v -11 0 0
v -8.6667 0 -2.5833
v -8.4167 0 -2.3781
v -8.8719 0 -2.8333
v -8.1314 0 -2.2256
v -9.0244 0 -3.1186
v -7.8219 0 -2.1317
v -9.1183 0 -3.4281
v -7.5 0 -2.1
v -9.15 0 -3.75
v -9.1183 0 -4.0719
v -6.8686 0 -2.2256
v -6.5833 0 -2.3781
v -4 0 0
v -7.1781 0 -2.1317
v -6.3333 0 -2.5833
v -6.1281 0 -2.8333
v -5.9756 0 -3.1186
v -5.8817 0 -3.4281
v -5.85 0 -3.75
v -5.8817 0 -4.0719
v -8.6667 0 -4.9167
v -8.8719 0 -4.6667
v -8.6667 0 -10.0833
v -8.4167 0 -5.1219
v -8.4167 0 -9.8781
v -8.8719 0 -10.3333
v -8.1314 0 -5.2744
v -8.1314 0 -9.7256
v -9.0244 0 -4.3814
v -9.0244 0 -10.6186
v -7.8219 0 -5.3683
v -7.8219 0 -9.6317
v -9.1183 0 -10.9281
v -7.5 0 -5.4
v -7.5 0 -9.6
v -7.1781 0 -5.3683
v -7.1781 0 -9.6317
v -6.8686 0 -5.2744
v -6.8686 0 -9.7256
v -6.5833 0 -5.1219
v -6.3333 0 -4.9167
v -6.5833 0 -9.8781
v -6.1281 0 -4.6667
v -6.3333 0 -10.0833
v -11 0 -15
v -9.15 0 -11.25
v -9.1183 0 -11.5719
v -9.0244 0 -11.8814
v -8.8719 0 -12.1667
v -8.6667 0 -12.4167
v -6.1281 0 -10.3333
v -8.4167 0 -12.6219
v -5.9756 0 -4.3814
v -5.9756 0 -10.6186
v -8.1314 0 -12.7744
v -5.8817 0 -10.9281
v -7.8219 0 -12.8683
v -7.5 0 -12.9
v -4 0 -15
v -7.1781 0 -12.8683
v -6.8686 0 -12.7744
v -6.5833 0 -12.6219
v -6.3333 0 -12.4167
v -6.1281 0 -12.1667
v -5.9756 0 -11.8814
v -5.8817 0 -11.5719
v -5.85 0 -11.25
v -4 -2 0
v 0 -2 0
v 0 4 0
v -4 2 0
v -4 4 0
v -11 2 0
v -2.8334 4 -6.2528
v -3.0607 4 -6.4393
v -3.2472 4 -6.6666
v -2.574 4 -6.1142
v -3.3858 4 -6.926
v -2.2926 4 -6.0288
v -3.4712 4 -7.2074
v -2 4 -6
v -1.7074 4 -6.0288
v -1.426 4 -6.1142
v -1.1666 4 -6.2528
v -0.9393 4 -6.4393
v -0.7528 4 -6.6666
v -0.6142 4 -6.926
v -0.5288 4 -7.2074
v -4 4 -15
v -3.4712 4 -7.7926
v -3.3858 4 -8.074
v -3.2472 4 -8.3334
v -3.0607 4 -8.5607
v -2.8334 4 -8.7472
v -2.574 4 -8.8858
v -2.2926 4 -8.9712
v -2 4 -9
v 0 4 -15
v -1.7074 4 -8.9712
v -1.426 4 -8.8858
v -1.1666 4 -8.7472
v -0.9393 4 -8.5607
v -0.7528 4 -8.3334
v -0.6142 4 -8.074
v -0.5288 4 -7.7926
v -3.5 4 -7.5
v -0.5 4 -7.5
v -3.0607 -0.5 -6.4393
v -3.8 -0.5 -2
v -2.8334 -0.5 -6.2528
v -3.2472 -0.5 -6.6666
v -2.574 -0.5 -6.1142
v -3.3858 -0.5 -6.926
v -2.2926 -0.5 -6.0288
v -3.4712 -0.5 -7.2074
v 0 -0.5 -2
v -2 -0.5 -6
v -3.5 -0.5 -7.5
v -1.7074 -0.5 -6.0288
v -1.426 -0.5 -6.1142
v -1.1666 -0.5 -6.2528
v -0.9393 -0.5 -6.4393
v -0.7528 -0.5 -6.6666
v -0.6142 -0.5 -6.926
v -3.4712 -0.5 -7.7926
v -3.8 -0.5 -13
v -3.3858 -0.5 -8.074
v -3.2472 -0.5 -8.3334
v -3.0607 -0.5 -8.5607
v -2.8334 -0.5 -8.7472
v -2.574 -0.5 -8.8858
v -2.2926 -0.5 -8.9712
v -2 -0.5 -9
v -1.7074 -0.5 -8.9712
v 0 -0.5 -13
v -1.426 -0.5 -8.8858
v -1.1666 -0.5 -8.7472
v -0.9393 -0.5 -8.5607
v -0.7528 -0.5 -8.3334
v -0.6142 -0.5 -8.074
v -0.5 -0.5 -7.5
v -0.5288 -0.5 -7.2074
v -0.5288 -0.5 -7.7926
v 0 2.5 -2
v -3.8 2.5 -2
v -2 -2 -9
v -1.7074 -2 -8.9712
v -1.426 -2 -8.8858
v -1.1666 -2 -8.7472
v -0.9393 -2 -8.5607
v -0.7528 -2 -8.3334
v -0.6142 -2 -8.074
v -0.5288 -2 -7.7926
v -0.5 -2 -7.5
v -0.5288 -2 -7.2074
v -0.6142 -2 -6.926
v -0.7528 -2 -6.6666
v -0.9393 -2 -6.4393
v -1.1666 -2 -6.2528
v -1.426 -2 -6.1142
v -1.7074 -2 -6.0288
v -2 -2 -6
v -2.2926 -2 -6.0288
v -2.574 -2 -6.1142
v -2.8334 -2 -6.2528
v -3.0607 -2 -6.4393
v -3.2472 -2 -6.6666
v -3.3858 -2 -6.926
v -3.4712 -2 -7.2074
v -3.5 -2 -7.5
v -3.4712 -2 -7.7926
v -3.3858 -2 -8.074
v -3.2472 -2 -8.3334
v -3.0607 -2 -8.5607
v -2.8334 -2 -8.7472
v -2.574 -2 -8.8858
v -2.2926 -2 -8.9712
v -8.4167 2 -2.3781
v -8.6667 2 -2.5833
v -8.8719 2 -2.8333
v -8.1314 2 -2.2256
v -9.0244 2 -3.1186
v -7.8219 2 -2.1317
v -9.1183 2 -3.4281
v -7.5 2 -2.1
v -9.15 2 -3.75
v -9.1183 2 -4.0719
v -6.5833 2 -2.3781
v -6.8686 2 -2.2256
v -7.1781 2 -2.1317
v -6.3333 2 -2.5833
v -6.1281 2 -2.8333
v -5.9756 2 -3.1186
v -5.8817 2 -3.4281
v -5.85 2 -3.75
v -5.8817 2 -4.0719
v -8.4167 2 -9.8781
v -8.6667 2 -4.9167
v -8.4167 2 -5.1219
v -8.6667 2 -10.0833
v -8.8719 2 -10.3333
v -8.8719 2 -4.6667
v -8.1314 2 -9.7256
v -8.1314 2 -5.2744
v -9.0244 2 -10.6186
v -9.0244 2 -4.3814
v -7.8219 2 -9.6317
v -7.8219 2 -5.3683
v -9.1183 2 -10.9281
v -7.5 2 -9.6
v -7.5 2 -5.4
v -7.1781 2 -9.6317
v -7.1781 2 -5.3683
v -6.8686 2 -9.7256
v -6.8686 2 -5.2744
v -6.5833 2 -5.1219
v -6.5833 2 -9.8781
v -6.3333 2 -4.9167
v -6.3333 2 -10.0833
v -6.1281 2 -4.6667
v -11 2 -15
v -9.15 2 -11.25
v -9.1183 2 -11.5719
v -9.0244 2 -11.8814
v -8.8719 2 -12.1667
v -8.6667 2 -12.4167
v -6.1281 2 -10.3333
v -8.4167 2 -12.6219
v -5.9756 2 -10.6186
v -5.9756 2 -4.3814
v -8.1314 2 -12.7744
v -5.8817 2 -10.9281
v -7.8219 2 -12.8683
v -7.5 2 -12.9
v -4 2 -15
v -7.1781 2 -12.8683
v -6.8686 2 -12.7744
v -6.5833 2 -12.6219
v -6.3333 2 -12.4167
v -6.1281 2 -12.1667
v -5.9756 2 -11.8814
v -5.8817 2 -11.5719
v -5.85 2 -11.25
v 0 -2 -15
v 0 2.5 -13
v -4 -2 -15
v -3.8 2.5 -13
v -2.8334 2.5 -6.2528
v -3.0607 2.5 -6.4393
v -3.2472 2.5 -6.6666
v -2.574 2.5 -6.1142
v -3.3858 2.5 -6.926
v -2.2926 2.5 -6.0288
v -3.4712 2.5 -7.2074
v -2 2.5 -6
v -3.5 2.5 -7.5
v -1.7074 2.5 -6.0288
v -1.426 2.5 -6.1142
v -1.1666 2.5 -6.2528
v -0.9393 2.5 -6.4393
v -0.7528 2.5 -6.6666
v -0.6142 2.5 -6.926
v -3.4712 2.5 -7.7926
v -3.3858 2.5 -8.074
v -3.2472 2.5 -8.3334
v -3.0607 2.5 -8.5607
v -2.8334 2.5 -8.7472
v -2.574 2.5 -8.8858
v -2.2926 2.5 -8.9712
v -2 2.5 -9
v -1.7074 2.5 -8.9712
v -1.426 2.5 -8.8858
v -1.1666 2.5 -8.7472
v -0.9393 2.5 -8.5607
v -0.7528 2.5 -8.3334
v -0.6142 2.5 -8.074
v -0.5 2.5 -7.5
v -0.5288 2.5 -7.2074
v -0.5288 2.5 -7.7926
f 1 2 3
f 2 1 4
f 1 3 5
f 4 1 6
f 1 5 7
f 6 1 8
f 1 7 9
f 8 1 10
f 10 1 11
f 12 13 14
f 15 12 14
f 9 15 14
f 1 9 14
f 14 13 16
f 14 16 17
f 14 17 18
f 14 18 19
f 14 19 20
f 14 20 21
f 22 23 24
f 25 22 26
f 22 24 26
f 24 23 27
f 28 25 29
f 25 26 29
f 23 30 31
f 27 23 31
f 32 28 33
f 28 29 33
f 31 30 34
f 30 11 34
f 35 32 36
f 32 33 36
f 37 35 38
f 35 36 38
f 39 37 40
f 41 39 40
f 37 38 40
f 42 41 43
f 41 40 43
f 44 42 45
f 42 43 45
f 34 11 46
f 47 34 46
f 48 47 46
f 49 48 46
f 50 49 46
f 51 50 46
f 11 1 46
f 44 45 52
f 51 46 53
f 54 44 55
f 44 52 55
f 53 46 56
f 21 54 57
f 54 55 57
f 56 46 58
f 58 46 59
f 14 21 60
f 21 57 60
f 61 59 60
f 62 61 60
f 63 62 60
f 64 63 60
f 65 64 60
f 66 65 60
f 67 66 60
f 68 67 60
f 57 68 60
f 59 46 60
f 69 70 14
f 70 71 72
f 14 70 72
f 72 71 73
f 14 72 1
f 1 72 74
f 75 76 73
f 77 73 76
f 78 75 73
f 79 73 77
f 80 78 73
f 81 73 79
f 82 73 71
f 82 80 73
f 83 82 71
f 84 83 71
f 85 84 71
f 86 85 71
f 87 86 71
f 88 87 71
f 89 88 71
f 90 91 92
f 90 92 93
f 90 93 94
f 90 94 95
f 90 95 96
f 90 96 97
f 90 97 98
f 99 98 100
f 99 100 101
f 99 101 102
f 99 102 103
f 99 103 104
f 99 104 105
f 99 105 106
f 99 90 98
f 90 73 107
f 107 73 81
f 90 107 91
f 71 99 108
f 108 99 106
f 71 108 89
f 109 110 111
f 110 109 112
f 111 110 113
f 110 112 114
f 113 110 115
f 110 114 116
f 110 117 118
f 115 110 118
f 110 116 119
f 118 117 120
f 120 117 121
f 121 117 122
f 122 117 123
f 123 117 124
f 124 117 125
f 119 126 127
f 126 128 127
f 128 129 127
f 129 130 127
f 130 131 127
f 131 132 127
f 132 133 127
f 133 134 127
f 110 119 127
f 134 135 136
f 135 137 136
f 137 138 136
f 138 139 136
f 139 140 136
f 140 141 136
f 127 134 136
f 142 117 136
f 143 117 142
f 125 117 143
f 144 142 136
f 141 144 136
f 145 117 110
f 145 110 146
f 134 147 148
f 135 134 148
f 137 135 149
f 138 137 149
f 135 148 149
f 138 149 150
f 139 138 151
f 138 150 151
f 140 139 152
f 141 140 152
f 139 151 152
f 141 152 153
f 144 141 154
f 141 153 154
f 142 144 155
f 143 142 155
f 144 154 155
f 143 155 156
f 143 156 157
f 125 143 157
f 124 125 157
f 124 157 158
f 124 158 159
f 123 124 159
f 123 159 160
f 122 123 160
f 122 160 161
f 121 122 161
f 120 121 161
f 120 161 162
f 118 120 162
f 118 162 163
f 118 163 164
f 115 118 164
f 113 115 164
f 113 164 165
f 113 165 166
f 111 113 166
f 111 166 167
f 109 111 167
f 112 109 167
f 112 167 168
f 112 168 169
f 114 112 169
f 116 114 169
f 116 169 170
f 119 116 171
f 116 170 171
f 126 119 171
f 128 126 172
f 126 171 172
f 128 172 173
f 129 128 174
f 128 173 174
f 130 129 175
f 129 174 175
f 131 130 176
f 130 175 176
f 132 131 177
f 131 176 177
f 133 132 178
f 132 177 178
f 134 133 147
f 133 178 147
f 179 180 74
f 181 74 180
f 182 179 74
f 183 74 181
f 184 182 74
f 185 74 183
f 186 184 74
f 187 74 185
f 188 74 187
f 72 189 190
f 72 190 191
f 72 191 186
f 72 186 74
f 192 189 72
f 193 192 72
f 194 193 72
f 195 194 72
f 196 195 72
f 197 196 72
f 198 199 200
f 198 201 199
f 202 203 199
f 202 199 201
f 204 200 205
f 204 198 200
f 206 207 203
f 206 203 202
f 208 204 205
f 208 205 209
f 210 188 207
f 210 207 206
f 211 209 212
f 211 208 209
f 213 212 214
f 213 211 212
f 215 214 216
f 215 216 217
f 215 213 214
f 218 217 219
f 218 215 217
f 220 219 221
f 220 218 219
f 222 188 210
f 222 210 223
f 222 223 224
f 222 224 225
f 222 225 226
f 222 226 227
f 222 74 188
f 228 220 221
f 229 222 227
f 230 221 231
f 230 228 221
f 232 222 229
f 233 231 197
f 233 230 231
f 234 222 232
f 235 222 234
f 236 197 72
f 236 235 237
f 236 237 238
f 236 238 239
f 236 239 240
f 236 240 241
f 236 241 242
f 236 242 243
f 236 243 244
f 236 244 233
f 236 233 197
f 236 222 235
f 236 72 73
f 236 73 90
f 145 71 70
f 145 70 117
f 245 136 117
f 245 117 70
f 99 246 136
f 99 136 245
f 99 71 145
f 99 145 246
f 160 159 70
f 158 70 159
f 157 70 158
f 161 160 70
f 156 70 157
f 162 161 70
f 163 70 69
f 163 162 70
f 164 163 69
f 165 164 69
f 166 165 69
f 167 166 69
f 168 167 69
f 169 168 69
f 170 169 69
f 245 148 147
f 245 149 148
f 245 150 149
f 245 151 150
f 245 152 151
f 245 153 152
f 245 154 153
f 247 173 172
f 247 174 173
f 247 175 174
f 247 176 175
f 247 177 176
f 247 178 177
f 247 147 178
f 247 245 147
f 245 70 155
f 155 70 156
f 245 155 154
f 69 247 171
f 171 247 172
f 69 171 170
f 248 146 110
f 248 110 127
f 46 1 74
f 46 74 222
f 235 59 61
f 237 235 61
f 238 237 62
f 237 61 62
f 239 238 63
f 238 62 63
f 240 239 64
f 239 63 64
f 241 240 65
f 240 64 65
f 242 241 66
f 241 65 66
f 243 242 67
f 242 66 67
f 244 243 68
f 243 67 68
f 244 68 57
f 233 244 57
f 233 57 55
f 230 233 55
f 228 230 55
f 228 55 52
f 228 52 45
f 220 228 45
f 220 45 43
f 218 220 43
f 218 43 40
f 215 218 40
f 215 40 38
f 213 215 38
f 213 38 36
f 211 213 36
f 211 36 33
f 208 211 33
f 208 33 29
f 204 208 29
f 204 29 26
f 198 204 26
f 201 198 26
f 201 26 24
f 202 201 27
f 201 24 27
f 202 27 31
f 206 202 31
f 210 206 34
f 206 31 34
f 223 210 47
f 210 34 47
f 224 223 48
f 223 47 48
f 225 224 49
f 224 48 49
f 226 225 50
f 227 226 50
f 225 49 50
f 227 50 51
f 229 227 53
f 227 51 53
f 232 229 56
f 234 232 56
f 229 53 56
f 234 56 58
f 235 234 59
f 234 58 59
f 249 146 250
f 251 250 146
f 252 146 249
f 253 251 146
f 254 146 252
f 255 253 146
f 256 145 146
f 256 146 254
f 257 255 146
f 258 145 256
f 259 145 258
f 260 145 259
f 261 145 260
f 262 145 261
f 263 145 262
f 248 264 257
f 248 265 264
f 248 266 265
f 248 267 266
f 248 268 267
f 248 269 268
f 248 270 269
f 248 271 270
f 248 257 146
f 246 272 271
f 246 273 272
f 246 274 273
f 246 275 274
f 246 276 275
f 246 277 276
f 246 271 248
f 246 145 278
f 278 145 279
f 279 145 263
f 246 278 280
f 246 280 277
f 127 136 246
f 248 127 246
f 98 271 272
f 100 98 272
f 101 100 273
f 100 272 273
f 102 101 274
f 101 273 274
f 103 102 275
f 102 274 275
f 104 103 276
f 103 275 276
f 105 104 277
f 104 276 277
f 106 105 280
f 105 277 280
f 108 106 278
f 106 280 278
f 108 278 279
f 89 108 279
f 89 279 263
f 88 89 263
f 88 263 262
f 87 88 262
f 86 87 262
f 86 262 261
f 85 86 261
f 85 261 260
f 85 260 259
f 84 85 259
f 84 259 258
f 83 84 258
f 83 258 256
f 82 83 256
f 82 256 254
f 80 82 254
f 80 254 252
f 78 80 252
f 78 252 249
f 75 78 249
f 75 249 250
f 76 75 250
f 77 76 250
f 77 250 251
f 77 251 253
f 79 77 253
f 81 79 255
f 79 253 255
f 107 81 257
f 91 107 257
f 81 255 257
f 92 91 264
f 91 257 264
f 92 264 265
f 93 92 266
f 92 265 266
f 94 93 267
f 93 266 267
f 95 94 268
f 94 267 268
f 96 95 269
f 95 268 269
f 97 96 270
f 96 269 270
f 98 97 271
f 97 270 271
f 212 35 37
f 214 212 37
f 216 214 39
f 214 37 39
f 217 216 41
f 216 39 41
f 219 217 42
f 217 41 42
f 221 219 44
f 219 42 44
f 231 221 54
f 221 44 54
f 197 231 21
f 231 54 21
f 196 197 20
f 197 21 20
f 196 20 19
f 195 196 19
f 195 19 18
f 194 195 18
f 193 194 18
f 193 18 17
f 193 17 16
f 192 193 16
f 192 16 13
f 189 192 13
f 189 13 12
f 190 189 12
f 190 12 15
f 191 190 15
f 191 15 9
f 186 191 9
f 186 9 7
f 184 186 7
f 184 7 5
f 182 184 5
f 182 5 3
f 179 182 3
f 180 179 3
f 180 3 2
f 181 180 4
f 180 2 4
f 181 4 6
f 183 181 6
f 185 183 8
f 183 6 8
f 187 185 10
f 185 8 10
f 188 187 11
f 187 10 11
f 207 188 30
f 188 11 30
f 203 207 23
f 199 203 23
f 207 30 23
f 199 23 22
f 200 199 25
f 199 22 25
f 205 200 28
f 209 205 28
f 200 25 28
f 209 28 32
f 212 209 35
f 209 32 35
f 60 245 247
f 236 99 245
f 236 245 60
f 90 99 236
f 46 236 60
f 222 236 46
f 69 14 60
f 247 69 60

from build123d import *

# Parameters (mm, degrees)
SKETCH1_W           = 11
SKETCH1_H           = 15
BOSS_EXTRUDE3_DEPTH = 2
SKETCH2_W           = 4
SKETCH2_H           = 15
BOSS_EXTRUDE4_DEPTH = 2
SKETCH3_W           = 4
SKETCH3_H           = 15
BOSS_EXTRUDE5_DEPTH = 2
SKETCH4_R           = 1.65
CUT_EXTRUDE2_DEPTH  = 13
SKETCH6_W           = 11
SKETCH6_H           = 3
CUT_EXTRUDE4_DEPTH  = 3.8
SKETCH7_R           = 1.5
CUT_EXTRUDE5_DEPTH  = 17.8


with BuildPart() as part:
    # Sketch1 → Boss-Extrude3 (new body)
    with BuildSketch(Plane(origin=(0, 0, 0), x_dir=(1, 0, 0), z_dir=(0, 1, 0))):
        with Locations((-5.5, 7.5)):
            Rectangle(SKETCH1_W, SKETCH1_H)
    extrude(amount=BOSS_EXTRUDE3_DEPTH)

    # Sketch2 → Boss-Extrude4 (add)
    with BuildSketch(Plane(origin=(0, 2, 0), x_dir=(1, 0, 0), z_dir=(0, 1, 0))):
        with Locations((-2, 7.5)):
            Rectangle(SKETCH2_W, SKETCH2_H)
    extrude(amount=BOSS_EXTRUDE4_DEPTH)

    # Sketch3 → Boss-Extrude5 (add)
    with BuildSketch(Plane(origin=(0, 0, 0), x_dir=(-1, 0, 0), z_dir=(0, -1, 0))):
        with Locations((2, 7.5)):
            Rectangle(SKETCH3_W, SKETCH3_H)
    extrude(amount=BOSS_EXTRUDE5_DEPTH)

    # Sketch4 → Cut-Extrude2 (cut)
    with BuildSketch(Plane(origin=(0, 0, 0), x_dir=(-1, 0, 0), z_dir=(0, -1, 0))):
        with Locations(Location((7.5, 11.25, 0), (0, 0, 90))):
            Circle(SKETCH4_R)
        with Locations(Location((7.5, 3.75, 0), (0, 0, 90))):
            Circle(SKETCH4_R)
    extrude(amount=-CUT_EXTRUDE2_DEPTH, mode=Mode.SUBTRACT)

    # Sketch6 → Cut-Extrude4 (cut)
    with BuildSketch(Plane(origin=(0, 0, 0), x_dir=(0, 0, -1), z_dir=(1, 0, 0))):
        with Locations((7.5, 1)):
            Rectangle(SKETCH6_W, SKETCH6_H)
    extrude(amount=-CUT_EXTRUDE4_DEPTH, mode=Mode.SUBTRACT)

    # Sketch7 → Cut-Extrude5 (cut)
    with BuildSketch(Plane(origin=(0, -2, 0), x_dir=(-1, 0, 0), z_dir=(0, -1, 0))):
        with Locations(Location((2, 7.5, 0), (0, 0, 90))):
            Circle(SKETCH7_R)
    extrude(amount=-CUT_EXTRUDE5_DEPTH, mode=Mode.SUBTRACT)


solid = part.part
